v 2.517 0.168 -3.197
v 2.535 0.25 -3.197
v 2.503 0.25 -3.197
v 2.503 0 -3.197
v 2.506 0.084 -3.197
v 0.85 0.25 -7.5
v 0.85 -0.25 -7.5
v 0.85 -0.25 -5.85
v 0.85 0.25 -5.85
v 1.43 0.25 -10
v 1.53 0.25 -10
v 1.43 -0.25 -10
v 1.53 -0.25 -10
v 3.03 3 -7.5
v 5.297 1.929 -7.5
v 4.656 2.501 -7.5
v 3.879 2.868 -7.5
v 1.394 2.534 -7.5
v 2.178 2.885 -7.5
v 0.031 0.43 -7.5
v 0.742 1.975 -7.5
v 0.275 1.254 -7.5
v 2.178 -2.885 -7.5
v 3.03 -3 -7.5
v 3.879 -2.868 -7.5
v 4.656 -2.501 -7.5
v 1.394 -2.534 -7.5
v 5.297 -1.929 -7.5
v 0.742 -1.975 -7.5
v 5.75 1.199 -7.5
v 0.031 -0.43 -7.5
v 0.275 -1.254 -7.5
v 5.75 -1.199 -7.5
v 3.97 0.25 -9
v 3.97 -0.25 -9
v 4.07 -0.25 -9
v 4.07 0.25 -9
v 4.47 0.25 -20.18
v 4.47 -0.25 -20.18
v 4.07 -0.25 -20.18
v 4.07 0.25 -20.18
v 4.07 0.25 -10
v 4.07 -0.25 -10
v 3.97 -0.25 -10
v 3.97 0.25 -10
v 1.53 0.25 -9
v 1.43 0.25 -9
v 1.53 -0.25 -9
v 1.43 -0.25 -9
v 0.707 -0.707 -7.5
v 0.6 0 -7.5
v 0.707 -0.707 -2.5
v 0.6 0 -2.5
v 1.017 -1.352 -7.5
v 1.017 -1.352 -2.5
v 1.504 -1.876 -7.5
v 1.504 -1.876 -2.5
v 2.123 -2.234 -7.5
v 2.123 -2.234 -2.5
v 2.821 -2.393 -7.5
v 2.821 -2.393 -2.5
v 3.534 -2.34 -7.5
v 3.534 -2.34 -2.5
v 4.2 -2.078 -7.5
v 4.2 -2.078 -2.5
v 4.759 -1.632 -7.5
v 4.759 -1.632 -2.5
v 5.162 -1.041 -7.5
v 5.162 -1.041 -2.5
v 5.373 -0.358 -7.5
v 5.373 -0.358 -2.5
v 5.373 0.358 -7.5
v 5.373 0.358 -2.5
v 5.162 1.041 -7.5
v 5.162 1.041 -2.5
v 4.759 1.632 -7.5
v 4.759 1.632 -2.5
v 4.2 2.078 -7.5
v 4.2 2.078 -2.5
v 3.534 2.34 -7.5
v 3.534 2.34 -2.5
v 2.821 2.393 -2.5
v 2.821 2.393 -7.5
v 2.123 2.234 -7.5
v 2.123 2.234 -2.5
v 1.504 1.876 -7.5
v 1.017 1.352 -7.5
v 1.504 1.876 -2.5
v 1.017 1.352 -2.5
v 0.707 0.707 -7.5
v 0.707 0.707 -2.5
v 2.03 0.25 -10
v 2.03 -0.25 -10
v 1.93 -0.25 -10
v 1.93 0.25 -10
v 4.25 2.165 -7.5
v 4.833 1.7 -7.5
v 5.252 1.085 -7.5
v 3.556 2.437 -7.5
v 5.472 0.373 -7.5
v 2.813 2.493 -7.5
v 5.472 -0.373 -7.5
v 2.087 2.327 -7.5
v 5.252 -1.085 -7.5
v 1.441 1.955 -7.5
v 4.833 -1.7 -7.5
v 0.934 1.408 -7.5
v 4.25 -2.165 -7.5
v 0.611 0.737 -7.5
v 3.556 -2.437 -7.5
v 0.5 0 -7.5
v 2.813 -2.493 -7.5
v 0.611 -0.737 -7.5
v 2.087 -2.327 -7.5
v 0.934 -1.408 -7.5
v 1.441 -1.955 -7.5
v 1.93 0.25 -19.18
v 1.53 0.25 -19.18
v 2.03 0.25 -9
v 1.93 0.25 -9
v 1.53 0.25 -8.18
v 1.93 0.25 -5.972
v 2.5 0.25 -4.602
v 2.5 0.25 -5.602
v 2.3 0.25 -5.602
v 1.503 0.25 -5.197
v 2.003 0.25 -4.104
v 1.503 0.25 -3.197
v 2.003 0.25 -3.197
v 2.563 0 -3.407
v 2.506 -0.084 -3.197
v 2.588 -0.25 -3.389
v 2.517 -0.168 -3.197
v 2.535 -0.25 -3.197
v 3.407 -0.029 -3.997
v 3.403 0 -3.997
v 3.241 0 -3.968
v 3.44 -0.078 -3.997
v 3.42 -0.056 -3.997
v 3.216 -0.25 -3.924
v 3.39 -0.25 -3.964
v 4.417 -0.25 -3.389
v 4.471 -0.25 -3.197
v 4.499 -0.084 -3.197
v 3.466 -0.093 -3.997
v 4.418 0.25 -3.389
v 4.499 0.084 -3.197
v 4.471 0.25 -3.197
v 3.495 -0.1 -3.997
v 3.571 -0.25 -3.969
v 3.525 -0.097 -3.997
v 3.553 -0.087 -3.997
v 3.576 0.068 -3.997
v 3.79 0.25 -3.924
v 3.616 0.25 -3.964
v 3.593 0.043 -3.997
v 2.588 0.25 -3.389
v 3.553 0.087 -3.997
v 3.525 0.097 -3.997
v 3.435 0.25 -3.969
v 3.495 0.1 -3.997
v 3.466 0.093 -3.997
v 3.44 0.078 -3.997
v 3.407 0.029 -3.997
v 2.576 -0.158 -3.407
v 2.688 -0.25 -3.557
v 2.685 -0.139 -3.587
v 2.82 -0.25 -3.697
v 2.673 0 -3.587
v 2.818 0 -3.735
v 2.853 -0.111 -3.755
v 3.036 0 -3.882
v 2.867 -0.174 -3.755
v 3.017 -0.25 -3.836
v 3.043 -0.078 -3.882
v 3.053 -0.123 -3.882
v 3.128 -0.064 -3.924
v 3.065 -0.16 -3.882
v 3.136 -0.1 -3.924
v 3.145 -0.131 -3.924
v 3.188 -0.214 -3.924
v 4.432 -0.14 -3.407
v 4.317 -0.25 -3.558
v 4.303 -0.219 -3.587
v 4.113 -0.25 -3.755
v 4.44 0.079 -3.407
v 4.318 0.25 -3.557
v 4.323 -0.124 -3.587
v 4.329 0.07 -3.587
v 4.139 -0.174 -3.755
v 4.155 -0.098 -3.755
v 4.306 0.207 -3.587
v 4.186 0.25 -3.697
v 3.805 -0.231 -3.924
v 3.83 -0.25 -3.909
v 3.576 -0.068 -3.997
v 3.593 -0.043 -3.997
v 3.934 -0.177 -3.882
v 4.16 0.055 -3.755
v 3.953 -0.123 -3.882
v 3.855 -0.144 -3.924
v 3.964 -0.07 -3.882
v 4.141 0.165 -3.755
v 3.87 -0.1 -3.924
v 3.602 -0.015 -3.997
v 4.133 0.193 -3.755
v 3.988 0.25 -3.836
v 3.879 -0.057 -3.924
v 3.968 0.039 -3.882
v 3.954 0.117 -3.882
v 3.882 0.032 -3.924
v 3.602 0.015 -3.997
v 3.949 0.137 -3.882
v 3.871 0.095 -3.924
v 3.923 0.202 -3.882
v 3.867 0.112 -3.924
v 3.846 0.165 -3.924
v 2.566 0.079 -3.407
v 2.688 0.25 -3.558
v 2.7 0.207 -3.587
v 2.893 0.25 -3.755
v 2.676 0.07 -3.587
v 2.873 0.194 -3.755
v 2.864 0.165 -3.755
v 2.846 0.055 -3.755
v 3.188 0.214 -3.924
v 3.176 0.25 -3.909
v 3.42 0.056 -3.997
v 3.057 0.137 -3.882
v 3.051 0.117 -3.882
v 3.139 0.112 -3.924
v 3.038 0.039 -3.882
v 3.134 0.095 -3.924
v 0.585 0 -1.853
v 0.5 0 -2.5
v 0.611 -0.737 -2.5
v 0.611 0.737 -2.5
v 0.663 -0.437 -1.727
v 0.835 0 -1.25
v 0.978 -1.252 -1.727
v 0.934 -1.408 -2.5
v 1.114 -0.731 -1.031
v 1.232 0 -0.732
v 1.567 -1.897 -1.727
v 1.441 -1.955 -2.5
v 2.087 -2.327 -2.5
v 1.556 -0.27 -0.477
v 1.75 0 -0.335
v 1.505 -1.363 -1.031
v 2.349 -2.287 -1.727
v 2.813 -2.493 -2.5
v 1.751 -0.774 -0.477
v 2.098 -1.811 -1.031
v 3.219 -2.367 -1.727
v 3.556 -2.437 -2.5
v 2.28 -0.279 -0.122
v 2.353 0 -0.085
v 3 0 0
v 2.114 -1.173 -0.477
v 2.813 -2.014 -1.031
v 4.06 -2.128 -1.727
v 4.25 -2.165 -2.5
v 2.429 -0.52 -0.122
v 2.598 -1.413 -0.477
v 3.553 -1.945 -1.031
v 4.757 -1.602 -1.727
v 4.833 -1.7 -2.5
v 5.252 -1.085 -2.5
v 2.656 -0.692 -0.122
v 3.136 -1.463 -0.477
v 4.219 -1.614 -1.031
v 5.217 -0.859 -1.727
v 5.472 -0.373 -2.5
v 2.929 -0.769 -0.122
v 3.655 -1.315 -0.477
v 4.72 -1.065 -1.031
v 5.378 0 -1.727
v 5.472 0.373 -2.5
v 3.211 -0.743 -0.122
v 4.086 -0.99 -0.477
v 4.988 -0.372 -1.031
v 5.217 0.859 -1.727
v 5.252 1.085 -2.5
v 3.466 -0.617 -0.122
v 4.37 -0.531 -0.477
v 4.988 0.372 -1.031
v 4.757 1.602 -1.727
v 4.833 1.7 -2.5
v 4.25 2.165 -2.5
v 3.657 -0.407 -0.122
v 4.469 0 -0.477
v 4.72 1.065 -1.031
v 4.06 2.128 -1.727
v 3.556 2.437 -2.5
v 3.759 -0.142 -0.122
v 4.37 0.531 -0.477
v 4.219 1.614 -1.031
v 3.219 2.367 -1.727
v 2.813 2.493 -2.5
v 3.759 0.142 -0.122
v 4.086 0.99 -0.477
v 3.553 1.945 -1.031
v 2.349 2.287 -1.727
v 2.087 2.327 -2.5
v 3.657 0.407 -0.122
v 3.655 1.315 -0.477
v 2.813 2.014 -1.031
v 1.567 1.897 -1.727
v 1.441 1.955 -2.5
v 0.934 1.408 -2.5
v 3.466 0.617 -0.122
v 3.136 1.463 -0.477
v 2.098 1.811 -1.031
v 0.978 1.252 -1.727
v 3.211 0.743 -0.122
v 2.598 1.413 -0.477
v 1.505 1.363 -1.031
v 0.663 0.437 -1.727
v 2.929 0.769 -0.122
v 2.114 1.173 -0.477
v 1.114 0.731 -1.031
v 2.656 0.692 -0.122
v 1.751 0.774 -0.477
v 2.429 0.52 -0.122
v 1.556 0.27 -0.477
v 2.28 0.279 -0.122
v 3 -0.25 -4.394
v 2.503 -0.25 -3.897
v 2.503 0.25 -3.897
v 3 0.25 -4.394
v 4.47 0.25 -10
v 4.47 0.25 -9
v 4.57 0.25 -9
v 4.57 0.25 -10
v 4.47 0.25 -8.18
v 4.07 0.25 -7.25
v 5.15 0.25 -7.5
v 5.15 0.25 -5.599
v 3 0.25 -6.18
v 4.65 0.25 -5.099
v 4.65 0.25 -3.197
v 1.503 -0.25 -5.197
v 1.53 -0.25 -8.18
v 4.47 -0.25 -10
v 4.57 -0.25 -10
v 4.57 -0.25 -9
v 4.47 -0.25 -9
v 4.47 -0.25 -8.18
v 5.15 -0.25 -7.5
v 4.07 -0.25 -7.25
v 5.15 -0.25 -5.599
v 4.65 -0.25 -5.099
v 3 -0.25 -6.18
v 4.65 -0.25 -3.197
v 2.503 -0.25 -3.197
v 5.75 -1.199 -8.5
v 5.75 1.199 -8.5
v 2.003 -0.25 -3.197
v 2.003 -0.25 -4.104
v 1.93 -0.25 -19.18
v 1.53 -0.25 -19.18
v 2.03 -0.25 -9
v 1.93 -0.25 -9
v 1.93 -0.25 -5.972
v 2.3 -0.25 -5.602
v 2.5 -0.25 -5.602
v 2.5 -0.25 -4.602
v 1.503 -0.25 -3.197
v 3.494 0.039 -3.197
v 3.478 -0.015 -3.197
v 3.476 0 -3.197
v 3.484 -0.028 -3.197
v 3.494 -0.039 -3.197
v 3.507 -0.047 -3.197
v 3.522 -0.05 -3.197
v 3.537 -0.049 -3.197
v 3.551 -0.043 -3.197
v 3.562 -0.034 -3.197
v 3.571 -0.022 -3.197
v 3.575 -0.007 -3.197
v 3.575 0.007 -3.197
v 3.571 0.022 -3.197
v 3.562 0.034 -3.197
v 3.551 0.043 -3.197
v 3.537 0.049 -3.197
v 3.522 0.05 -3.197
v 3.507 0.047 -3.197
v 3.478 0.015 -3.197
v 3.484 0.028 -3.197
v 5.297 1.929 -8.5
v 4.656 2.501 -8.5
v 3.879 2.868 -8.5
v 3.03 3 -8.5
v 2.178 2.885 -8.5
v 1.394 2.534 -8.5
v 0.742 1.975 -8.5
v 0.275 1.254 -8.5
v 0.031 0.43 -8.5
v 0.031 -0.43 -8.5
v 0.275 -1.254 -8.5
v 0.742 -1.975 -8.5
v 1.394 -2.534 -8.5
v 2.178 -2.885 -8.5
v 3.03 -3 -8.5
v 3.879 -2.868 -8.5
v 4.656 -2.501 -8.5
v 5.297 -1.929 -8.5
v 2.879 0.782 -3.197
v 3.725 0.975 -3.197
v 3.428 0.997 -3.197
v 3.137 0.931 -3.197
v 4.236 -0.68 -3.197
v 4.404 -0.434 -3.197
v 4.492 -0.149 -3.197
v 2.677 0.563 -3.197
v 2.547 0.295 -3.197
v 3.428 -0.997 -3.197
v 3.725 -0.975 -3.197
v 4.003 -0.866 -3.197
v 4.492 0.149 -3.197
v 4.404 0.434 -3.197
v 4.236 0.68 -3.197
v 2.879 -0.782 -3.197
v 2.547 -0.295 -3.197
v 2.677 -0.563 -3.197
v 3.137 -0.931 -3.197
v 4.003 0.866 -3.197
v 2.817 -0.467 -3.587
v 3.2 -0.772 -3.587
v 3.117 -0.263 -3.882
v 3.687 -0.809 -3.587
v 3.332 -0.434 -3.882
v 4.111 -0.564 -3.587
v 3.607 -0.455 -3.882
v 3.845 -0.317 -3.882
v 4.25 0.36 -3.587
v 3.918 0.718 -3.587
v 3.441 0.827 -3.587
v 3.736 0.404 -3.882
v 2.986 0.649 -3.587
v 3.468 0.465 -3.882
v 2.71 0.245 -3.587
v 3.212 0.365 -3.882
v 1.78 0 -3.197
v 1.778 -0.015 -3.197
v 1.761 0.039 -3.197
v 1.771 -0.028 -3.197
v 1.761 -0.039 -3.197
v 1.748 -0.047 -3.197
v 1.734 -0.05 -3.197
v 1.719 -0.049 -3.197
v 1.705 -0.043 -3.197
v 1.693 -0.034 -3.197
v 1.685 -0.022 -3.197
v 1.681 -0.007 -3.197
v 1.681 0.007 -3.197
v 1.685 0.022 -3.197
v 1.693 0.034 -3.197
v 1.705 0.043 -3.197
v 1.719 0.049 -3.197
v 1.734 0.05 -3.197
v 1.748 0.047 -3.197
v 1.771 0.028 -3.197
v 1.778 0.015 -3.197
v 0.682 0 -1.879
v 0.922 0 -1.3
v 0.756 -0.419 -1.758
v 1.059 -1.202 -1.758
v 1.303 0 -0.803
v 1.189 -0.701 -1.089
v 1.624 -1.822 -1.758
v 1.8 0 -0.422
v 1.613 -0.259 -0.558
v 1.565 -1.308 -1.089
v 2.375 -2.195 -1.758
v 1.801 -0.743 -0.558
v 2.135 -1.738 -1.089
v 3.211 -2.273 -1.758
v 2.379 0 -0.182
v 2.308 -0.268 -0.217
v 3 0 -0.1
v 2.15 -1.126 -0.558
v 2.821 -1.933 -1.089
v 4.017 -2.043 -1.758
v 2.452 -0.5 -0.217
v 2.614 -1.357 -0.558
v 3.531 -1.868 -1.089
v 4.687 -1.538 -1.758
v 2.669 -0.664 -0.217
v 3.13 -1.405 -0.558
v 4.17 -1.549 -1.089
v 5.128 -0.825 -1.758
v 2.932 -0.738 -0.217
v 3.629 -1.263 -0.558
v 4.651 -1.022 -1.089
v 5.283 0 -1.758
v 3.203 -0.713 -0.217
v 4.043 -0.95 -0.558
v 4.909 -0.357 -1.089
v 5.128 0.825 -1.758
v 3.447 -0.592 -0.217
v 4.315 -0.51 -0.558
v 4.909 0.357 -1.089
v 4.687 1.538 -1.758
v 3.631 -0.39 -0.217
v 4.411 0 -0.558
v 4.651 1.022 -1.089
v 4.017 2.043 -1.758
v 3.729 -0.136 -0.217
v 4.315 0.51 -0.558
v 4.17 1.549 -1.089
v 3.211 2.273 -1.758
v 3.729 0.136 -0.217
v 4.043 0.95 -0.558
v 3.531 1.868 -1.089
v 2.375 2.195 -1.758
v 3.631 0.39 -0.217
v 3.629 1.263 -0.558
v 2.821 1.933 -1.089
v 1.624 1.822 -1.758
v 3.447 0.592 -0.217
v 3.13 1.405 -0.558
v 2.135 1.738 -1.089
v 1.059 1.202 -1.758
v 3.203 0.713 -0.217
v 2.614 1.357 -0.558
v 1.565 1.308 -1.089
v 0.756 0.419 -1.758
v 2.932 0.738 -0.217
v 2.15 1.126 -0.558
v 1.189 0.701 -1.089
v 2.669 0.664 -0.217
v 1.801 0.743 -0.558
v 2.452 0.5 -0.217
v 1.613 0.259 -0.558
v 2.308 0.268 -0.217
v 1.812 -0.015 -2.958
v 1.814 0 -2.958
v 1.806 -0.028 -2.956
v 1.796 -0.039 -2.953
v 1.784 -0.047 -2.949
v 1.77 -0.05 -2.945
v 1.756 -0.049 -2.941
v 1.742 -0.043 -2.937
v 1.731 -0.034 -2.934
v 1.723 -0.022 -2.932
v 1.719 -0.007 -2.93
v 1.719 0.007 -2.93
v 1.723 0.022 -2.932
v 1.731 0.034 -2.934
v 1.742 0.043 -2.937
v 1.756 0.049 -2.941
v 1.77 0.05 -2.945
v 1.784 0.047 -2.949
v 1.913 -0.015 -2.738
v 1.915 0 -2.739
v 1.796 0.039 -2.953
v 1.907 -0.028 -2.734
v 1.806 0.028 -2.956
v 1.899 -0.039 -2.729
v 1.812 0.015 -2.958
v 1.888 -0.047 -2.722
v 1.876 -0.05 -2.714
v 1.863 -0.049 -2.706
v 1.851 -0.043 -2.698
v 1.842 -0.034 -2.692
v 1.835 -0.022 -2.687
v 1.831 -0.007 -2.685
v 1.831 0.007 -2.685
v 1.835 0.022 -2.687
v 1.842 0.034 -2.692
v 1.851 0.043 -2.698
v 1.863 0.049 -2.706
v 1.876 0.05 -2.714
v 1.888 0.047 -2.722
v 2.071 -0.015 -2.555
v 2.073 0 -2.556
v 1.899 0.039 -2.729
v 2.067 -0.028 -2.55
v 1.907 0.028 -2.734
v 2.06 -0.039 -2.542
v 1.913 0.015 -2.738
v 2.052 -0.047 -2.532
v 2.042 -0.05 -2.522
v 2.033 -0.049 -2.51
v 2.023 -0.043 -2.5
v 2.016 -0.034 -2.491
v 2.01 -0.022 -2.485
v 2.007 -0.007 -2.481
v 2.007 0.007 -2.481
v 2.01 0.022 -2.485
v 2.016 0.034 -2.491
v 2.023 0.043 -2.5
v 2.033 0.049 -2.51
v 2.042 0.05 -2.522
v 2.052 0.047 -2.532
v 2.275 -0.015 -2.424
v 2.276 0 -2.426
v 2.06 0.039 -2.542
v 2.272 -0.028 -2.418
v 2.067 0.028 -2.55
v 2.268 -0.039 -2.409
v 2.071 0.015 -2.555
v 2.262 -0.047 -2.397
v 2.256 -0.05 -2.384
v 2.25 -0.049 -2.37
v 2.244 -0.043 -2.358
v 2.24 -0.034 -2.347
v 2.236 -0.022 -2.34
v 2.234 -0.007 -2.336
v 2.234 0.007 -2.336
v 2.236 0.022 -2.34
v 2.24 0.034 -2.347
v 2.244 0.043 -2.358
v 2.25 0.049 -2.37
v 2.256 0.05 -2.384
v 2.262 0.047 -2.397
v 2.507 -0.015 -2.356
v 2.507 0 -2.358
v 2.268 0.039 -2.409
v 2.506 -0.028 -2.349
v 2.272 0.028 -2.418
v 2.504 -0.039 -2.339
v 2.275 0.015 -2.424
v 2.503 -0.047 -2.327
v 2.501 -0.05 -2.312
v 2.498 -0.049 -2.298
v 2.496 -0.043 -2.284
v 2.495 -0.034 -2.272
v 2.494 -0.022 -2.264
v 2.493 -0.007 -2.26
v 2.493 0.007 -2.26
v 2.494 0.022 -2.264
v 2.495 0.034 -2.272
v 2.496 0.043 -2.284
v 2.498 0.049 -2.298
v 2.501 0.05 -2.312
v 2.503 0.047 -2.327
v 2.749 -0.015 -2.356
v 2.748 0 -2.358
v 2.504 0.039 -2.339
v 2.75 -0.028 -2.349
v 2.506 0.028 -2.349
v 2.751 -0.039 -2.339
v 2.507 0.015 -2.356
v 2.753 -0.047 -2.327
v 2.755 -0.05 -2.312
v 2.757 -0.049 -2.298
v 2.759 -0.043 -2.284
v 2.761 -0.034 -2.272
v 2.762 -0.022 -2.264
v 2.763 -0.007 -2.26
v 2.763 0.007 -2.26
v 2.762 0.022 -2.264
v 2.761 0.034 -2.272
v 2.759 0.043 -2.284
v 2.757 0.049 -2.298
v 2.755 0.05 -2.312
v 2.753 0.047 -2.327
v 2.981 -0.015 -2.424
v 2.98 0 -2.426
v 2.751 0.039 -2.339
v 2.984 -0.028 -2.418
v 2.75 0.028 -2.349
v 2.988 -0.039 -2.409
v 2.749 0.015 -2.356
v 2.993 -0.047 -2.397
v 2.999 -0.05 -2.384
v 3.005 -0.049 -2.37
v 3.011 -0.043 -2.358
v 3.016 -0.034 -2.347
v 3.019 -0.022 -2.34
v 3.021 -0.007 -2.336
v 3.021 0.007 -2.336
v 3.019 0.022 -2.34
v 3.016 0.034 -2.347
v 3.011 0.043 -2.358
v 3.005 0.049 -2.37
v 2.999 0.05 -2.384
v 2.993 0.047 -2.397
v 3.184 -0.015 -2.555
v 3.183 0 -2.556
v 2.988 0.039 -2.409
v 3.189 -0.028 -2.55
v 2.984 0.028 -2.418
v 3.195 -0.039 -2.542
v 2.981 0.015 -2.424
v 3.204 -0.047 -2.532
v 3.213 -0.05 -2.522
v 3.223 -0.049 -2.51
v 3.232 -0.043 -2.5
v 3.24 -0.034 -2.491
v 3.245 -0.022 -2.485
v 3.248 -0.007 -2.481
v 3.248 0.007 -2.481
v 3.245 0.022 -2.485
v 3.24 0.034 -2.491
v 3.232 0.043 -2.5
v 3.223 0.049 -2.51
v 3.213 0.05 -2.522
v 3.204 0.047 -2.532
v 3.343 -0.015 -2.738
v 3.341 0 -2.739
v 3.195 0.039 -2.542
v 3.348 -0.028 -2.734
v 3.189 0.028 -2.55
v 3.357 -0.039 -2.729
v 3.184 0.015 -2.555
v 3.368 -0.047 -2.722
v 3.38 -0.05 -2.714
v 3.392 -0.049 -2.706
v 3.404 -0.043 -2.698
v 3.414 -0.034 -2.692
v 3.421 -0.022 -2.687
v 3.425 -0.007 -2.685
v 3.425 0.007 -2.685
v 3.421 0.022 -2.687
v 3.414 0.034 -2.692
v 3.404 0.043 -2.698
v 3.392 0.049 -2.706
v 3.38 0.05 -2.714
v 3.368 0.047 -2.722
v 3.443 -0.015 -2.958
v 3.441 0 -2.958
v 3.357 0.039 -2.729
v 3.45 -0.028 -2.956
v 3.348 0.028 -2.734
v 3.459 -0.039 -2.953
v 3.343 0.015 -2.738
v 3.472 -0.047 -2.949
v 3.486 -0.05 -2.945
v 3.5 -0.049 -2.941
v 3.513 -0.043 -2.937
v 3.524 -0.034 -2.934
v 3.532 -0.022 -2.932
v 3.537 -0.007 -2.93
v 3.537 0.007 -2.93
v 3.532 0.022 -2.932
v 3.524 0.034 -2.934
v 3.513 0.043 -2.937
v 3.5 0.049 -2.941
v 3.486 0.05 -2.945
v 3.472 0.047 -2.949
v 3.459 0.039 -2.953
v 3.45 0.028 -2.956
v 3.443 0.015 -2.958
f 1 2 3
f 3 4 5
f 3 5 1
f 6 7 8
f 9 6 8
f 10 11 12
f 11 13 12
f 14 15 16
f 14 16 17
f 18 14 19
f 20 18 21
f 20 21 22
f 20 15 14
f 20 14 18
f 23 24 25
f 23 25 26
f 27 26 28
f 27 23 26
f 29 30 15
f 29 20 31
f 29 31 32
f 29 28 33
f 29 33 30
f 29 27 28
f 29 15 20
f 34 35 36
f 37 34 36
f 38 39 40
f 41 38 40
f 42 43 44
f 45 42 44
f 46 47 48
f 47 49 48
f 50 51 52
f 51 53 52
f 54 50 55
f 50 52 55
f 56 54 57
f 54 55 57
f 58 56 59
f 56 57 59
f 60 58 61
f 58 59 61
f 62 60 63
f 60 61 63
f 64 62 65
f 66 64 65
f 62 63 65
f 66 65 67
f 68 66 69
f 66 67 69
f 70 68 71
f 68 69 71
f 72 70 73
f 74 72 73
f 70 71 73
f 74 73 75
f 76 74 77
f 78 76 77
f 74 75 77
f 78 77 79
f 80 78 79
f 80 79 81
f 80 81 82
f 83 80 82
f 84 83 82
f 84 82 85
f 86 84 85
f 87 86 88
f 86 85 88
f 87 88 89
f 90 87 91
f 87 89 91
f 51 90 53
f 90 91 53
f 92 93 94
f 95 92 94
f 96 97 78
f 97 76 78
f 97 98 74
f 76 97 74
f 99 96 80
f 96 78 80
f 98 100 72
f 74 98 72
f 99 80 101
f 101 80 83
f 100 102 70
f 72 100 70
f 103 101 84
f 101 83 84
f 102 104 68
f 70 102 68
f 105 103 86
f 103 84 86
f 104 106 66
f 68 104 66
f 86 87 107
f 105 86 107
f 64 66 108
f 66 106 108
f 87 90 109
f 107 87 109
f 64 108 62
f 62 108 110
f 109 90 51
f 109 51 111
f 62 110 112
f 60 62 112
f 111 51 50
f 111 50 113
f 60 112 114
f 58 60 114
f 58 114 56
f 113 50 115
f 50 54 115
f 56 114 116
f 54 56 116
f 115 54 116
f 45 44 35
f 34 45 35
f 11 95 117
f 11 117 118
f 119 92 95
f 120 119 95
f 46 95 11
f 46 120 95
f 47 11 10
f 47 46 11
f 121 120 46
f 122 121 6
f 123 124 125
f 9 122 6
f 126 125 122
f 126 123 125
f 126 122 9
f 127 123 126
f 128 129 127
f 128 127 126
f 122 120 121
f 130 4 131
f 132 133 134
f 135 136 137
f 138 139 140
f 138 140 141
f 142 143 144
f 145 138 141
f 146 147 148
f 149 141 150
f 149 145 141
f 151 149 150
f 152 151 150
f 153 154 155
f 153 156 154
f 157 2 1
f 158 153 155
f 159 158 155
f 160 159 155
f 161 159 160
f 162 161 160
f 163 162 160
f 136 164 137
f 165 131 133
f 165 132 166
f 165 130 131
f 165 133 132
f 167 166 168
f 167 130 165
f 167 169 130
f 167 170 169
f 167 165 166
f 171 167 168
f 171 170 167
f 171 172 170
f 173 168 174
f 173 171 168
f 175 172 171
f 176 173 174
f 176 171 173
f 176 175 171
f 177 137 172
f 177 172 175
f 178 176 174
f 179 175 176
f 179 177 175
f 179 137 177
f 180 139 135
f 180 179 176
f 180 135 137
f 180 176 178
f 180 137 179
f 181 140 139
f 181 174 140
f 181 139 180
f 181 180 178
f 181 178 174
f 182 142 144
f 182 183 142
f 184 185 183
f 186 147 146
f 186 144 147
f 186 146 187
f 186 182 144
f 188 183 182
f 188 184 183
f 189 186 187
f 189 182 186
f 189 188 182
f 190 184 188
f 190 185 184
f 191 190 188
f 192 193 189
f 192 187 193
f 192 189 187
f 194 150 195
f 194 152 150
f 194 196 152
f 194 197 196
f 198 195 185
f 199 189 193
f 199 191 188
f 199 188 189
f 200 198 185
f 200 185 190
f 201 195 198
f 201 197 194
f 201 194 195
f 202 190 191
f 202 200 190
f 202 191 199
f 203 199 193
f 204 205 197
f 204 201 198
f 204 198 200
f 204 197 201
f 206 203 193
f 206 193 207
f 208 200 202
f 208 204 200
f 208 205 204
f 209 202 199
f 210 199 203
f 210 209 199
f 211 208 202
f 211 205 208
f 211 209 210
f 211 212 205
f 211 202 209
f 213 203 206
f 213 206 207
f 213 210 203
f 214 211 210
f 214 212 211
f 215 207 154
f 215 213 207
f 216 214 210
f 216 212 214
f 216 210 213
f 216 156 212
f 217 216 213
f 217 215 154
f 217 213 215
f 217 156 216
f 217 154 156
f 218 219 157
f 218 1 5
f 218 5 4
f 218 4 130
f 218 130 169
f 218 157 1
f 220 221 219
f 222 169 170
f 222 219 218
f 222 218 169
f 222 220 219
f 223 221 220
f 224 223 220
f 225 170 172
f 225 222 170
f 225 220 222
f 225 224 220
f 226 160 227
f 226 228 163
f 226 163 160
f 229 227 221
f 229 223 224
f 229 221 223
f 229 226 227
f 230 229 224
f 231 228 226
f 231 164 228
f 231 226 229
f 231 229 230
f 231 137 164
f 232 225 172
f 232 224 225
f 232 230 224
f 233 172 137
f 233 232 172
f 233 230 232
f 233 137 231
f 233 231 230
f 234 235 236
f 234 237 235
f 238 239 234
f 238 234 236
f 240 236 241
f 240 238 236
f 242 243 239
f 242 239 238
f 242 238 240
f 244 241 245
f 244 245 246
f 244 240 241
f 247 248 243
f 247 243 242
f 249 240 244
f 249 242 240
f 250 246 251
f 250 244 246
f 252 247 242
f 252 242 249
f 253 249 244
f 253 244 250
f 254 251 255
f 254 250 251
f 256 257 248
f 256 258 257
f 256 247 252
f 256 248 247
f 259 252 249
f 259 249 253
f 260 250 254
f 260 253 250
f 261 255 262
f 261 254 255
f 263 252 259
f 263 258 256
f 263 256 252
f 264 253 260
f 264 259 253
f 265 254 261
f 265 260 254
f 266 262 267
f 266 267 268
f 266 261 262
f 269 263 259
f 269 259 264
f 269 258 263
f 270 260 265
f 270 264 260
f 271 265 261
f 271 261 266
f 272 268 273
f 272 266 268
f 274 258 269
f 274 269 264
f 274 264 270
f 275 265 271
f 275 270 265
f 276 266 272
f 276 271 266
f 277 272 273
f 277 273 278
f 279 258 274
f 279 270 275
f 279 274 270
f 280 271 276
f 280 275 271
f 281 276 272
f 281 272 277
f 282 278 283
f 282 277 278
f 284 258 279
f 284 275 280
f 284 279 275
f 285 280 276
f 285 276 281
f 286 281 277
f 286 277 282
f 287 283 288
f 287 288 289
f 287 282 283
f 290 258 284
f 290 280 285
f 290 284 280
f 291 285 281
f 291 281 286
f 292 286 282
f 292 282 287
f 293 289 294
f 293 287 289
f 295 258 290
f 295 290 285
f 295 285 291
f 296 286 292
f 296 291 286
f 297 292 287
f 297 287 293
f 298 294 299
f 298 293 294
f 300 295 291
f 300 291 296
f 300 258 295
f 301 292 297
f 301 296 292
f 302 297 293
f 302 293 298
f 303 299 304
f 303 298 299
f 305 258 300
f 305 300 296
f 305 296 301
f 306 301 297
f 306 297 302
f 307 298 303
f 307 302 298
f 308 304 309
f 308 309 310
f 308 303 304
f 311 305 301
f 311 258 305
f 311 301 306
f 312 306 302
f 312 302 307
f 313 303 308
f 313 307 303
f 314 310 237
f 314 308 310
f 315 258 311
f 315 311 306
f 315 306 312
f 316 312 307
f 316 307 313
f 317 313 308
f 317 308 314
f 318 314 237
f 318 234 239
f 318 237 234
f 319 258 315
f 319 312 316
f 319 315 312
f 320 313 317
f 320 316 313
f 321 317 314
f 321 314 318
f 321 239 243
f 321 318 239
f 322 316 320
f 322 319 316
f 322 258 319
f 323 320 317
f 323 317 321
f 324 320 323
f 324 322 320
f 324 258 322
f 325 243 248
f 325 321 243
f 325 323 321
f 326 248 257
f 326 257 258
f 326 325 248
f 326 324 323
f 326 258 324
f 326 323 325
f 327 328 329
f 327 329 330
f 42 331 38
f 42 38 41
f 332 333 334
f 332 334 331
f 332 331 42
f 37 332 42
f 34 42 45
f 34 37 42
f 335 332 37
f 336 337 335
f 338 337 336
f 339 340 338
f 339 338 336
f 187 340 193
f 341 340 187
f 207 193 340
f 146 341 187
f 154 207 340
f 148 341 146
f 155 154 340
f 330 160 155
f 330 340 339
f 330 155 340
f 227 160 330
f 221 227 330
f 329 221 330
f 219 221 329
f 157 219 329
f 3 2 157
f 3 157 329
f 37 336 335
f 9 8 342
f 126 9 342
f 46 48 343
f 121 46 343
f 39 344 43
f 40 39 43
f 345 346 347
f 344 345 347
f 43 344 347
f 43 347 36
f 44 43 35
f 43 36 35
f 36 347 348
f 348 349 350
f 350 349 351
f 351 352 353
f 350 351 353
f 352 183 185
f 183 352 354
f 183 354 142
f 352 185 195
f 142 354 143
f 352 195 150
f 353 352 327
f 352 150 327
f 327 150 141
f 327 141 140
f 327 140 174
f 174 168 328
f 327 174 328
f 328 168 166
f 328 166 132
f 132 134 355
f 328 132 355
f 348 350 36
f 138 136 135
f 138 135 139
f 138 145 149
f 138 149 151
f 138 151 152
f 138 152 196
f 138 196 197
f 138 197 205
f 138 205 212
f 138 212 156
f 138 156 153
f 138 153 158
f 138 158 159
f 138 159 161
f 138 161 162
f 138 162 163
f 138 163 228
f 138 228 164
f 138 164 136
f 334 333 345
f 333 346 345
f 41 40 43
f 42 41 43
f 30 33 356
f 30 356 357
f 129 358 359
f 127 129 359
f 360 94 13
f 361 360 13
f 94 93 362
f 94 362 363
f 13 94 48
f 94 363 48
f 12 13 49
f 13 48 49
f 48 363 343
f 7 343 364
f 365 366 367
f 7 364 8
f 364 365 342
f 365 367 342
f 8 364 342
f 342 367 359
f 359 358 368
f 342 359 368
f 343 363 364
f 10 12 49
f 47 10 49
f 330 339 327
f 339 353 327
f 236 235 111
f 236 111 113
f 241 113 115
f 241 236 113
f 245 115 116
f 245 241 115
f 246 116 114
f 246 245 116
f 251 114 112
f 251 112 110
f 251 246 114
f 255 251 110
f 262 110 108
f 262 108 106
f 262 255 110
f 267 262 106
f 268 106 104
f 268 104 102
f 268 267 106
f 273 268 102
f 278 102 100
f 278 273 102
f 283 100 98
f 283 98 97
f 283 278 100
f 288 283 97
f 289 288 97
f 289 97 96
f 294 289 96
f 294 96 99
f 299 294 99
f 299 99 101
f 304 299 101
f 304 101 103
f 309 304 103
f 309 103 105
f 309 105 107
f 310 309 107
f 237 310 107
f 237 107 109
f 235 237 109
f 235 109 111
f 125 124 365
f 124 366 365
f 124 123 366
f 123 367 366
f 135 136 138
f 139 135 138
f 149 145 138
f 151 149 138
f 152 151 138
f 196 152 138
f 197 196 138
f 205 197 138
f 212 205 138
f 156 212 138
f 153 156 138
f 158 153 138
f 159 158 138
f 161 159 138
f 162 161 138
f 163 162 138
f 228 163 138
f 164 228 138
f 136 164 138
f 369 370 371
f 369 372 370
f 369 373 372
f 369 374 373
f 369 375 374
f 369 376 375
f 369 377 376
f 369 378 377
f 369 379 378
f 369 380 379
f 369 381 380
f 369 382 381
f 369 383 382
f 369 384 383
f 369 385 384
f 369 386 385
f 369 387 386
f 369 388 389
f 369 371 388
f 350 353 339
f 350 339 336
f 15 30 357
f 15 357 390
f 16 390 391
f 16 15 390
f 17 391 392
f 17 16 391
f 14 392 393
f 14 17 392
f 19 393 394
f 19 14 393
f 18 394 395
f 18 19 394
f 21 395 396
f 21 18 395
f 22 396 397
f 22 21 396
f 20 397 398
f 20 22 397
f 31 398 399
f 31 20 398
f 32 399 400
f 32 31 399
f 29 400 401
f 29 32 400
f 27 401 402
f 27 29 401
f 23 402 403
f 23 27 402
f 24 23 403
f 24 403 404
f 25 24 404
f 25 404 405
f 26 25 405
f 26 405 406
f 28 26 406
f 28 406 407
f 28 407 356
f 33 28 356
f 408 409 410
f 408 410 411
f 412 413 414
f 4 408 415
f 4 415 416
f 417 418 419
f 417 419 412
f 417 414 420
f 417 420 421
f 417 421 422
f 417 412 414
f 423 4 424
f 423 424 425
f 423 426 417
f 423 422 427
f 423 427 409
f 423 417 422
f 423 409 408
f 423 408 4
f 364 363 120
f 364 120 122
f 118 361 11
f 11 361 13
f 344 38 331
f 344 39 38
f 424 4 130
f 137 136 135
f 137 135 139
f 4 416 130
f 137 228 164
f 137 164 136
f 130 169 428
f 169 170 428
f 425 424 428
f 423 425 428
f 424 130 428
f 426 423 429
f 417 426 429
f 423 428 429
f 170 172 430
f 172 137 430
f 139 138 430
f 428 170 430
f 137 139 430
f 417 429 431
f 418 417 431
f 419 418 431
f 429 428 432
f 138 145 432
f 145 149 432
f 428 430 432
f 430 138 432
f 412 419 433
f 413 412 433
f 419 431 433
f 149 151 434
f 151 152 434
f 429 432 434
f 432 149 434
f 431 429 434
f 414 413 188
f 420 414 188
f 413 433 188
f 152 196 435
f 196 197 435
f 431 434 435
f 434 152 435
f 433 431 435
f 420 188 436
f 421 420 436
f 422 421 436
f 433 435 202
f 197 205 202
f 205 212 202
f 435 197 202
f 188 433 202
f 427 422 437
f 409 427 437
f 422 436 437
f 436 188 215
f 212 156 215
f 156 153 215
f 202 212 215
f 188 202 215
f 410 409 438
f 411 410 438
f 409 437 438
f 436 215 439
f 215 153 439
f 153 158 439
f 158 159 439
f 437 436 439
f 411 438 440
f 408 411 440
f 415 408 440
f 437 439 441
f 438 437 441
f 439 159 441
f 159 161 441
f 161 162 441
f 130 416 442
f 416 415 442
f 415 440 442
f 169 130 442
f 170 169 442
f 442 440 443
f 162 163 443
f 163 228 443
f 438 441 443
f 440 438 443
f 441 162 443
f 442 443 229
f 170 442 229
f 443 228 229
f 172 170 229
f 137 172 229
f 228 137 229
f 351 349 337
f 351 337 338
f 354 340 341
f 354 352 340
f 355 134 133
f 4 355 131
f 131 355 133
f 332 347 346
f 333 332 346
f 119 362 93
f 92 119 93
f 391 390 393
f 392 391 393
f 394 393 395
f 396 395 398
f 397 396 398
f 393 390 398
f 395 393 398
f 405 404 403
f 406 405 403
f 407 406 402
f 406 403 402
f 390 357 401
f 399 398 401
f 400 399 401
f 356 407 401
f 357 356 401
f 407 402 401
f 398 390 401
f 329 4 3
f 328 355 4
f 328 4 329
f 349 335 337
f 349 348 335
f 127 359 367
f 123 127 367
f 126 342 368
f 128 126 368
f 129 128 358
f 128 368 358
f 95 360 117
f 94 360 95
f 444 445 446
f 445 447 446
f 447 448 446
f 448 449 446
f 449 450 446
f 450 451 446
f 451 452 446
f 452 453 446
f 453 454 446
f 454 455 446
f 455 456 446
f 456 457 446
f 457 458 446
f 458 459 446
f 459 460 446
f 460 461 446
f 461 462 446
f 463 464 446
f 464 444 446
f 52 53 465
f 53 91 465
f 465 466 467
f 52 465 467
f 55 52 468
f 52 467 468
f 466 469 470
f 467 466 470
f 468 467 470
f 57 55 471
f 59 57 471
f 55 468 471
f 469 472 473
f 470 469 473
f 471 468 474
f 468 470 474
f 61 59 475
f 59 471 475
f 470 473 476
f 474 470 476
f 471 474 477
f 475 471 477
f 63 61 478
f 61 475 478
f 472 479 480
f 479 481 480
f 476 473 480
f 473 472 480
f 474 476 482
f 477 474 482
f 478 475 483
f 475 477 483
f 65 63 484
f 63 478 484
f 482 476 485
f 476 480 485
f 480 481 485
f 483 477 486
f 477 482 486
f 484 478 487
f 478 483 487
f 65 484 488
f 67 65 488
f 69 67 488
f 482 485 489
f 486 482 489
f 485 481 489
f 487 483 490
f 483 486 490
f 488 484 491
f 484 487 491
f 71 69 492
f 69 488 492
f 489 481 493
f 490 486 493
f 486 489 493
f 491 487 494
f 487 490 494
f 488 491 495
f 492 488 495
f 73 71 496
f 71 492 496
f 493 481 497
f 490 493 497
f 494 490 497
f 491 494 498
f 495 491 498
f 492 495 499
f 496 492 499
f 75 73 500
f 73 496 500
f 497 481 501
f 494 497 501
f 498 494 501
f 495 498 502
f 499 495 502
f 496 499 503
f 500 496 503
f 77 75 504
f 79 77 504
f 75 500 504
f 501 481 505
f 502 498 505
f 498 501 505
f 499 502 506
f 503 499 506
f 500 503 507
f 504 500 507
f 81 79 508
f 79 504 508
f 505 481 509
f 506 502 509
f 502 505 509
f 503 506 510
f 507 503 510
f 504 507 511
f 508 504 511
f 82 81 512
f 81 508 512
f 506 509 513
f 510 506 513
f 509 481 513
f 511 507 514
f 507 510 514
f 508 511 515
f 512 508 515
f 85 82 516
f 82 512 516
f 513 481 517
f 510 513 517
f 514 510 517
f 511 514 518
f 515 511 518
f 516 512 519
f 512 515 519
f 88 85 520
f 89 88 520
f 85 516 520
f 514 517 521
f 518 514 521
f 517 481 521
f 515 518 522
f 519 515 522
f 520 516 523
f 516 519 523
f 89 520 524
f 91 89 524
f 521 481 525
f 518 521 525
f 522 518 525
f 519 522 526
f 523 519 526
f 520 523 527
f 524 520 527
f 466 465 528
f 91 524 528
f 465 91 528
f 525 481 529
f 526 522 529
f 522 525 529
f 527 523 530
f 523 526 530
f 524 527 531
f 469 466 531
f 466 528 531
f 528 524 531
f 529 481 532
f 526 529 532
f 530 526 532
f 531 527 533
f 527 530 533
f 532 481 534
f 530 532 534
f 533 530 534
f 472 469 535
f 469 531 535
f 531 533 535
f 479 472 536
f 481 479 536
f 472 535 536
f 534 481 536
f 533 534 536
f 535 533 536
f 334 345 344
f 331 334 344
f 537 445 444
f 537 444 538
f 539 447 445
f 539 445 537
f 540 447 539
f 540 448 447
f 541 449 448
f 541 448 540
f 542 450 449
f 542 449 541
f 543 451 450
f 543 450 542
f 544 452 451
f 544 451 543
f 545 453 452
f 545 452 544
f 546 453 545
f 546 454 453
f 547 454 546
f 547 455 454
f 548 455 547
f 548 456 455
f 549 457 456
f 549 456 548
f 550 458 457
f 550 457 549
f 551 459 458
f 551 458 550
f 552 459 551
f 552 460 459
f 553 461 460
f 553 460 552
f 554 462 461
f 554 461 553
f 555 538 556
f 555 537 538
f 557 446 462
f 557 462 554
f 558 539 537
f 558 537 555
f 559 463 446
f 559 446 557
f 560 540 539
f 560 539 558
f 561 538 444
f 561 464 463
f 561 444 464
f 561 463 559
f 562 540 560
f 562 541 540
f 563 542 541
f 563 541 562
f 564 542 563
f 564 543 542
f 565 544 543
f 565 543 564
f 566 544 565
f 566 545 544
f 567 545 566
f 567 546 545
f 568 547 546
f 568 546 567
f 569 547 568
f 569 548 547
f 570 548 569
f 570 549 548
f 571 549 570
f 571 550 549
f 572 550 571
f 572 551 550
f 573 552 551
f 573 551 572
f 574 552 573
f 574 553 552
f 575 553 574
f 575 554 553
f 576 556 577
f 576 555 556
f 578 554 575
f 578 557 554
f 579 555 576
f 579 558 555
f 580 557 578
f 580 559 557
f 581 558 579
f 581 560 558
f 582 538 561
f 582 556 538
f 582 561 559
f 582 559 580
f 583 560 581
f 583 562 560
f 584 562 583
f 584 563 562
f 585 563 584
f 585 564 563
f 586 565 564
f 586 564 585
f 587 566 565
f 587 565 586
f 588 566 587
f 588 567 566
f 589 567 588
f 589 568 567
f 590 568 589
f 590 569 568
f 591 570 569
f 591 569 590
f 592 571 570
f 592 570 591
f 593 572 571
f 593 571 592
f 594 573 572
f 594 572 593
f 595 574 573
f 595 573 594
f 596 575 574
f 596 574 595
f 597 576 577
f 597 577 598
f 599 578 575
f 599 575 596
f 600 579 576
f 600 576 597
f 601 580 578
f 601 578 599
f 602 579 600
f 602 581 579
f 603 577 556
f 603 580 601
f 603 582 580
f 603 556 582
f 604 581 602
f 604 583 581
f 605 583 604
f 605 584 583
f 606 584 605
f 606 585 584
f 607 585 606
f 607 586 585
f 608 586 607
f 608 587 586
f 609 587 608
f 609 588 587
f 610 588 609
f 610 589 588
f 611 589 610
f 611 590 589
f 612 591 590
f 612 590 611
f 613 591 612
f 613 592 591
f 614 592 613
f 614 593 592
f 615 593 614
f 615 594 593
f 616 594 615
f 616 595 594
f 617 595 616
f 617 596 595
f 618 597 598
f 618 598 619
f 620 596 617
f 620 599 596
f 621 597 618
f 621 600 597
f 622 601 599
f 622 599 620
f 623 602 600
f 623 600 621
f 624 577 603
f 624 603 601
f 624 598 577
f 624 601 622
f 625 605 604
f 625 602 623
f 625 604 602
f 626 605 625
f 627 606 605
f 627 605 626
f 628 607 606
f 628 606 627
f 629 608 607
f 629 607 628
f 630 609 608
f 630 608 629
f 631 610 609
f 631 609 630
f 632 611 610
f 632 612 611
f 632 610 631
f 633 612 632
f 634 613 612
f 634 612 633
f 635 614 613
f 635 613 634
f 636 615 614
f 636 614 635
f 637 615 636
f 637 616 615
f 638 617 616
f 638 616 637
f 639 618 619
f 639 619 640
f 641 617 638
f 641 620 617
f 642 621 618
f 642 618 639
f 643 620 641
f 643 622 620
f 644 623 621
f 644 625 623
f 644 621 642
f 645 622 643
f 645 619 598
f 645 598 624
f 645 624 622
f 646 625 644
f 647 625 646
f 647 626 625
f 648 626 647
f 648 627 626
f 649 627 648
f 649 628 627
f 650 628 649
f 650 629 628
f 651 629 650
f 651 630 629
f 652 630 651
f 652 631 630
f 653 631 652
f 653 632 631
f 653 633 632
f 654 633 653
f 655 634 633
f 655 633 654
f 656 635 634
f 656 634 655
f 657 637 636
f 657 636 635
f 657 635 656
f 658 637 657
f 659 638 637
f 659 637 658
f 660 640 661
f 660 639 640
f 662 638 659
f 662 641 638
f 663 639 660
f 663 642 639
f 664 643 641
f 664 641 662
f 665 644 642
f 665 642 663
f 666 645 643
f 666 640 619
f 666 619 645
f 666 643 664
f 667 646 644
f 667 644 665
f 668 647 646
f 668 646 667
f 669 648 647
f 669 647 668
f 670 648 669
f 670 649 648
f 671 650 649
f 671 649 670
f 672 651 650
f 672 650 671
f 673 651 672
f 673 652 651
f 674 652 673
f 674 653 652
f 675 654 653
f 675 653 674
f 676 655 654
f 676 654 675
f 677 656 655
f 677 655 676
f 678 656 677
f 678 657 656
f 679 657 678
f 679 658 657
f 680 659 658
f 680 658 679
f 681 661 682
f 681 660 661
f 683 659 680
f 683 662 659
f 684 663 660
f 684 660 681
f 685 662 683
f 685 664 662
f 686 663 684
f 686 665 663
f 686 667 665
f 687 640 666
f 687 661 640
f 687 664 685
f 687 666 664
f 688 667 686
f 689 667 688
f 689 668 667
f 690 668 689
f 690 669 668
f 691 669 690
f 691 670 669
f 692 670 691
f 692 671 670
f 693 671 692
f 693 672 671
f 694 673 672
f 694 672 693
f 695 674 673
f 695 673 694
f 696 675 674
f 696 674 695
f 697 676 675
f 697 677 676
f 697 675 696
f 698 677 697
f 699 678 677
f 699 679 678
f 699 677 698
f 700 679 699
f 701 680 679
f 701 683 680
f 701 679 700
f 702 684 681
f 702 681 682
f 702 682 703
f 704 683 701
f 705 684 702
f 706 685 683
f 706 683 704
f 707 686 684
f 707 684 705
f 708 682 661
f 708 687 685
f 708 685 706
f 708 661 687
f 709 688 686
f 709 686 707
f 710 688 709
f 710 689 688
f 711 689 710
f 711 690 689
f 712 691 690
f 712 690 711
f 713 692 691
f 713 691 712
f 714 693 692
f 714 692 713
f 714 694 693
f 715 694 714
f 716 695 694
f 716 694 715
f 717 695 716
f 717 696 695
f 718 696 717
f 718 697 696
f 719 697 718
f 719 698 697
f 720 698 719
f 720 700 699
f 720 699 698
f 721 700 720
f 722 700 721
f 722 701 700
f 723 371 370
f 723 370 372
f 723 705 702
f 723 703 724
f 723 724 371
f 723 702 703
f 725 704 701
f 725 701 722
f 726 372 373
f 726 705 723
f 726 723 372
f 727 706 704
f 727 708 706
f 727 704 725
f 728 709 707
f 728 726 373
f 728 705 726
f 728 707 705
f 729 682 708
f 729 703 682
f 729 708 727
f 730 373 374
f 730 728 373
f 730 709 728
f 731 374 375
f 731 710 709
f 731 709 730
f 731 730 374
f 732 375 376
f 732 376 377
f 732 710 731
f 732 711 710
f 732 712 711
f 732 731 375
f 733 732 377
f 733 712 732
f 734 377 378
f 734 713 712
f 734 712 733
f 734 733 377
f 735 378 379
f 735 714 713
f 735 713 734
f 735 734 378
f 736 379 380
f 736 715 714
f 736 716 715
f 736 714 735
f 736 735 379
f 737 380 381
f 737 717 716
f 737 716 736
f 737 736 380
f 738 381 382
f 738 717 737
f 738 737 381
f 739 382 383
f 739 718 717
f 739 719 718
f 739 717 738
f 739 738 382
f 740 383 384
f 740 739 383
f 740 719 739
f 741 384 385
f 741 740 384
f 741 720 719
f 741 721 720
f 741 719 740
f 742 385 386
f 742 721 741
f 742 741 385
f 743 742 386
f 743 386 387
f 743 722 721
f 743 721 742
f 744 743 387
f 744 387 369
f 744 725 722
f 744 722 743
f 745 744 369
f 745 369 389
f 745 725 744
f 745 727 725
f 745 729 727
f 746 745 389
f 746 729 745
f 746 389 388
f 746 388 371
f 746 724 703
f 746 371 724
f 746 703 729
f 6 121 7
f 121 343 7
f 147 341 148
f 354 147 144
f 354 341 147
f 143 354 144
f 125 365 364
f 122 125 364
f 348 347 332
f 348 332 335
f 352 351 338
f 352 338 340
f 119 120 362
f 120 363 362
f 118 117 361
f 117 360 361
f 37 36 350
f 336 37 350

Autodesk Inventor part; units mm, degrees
ref_plane "YZ Plane" through (0, 0, 0) normal (1, 0, 0) x (0, 1, 0)
ref_plane "XZ Plane" through (0, 0, 0) normal (0, 1, 0) x (-1, 0, 0)
ref_plane "XY Plane" through (0, 0, 0) normal (0, 0, 1) x (1, 0, 0)
sketch "Sketch1" plane through (0, 0, 0) normal (0, 1, 0) x (-1, 0, 0)
  line L0 (-1.93, -19.18) -> (-1.53, -19.18)
  line L1 (-4.47, -20.18) -> (-4.07, -20.18)
  line L2 (-0.5, -2.5) -> (-5.5, -2.5) construction
  line L3 (-5.5, -2.5) -> (-5.5, -7.5)
  line L4 (-5.5, -7.5) -> (-0.5, -7.5)
  line L5 (-0.5, -7.5) -> (-0.5, -2.5)
  line L6 (0, -7.5) -> (-6, -7.5)
  line L7 (-6, -7.5) -> (-6, -8.5)
  line L8 (-6, -8.5) -> (0, -8.5)
  line L9 (0, -8.5) -> (0, -7.5)
  arc A0 (-0.5, -2.5) -> (-5.5, -2.5) centre (-3, -2.5) ccw
  line L10 (0, -24.216) -> (0, 4.0361) projected
  line L11 (17.1925, 0) -> (-9.8654, 0) projected
  line L12 (-3, -8.5) -> (-3, -19.8408) construction
  line L13 (-1.53, -19.18) -> (-1.53, -10)
  line L14 (-1.93, -19.18) -> (-1.93, -10)
  line L15 (-4.07, -20.18) -> (-4.07, -10)
  line L16 (-4.47, -20.18) -> (-4.47, -10)
  line L17 (-3, -8.5) -> (-3, 0)
  line L18 (-6, -19.8408) -> (0, -19.8408) construction
  line L19 (-1.43, -9) -> (-1.53, -9)
  line L20 (-2.03, -9) -> (-2.03, -10)
  line L21 (-2.03, -10) -> (-1.93, -10)
  line L22 (-1.43, -10) -> (-1.43, -9)
  line L23 (-3.97, -9) -> (-4.07, -9)
  line L24 (-4.57, -9) -> (-4.57, -10)
  line L25 (-4.57, -10) -> (-4.47, -10)
  line L26 (-3.97, -10) -> (-3.97, -9)
  line L27 (-1.93, -9) -> (-2.03, -9)
  line L28 (-4.07, -9) -> (-4.07, -7.25)
  line L29 (-4.47, -9) -> (-4.57, -9)
  line L30 (-4.07, -10) -> (-3.97, -10)
  line L31 (-1.53, -10) -> (-1.43, -10)
  line L32 (-4.47, -9) -> (-4.47, -8.18)
  line L33 (-1.93, -9) -> (-1.93, -5.9716)
  line L34 (-1.53, -9) -> (-1.53, -8.18)
  line L35 (-4.47, -8.18) -> (-5.15, -7.5)
  line L36 (-1.53, -8.18) -> (-0.85, -7.5)
  line L37 (-0.85, -7.5) -> (-0.85, -5.85)
  line L38 (-5.15, -7.5) -> (-5.15, -5.5986)
  line L39 (-5.15, -5.5986) -> (-4.65, -5.0986)
  line L40 (-4.65, -5.0986) -> (-4.65, -3.1972)
  line L41 (-4.65, -3.1972) -> (-2.5028, -3.1972)
  line L42 (-0.85, -5.85) -> (-1.5028, -5.1972)
  line L43 (-1.5028, -5.1972) -> (-1.5028, -3.1972)
  line L44 (-1.5028, -3.1972) -> (-2.0028, -3.1972)
  line L45 (-2.0028, -3.1972) -> (-2.0028, -4.1043)
  line L46 (-2.0028, -4.1043) -> (-2.5, -4.6016)
  line L47 (-2.5, -4.6016) -> (-2.5, -5.6016)
  line L48 (-2.5, -5.6016) -> (-2.3, -5.6016)
  line L49 (-2.3, -5.6016) -> (-1.93, -5.9716)
  line L50 (8.8309, -12.5892) -> (8.8309, -17.0713)
  line L51 (8.7309, -12.5892) -> (8.8309, -12.5892)
  line L52 (8.8309, -17.0713) -> (9.3309, -17.0713)
  line L53 (9.3309, -17.0713) -> (9.3309, -12.5892)
  line L54 (11.3309, -18.2444) -> (11.8309, -18.2444)
  line L55 (11.3309, -12.5815) -> (11.3309, -18.2444)
  line L56 (11.8309, -18.2444) -> (11.8309, -12.5815)
  line L57 (8.2266, -6.0537) -> (8.2266, -7.4999)
  line L58 (8.5861, -5.6941) -> (8.2266, -6.0537)
  line L59 (8.5861, -4.3452) -> (8.5861, -5.6941)
  line L60 (8.2266, -7.4999) -> (8.8309, -8.1043)
  line L61 (9.3309, -7.3282) -> (9.7365, -6.9226)
  line L62 (9.7365, -6.9226) -> (10.3309, -6.9226)
  line L63 (10.3309, -6.9226) -> (10.3309, -5.844)
  line L64 (8.5861, -4.3452) -> (11.2106, -4.3452)
  line L65 (10.8309, -6.0512) -> (10.8309, -6.9149)
  line L66 (10.8309, -6.9149) -> (11.1527, -6.9149)
  line L67 (11.2393, -4.3452) -> (11.2106, -4.3452)
  line L68 (11.1527, -6.9149) -> (11.3309, -7.0932)
  line L69 (11.8309, -8.0966) -> (12.4276, -7.4999)
  line L70 (12.4276, -7.4999) -> (12.4276, -5.8553)
  line L71 (9.4309, -11.5892) -> (9.3309, -11.5892)
  line L72 (11.8309, -11.5815) -> (11.8309, -8.0966)
  line L73 (8.8309, -8.1043) -> (8.8309, -11.5892)
  line L74 (11.3309, -7.0932) -> (11.3309, -11.5815)
  line L75 (9.3309, -11.5892) -> (9.3309, -7.3282)
  line L76 (10.3309, -5.844) -> (11.2106, -4.9643)
  line L77 (11.7107, -5.1714) -> (10.8309, -6.0512)
  line L78 (11.2106, -4.3452) -> (11.2393, -4.3452) construction
  line L79 (12.4276, -5.8553) -> (12.2082, -5.6359)
  line L80 (11.2106, -4.2719) -> (11.2106, -4.3452)
  line L81 (11.2106, -4.9643) -> (11.2106, -4.2719)
  line L82 (11.2106, -4.2719) -> (11.2393, -4.3452)
  line L83 (11.7107, -4.3453) -> (11.7107, -5.1714)
  line L84 (10.8445, -3.7709) -> (11.3445, -3.7709) construction
  spline S0 degree 3 poles (11.9954, -4.3997) (11.9862, -4.3486) (11.9578, -4.2521) (11.8889, -4.1254) (11.7974, -4.0171) (11.6749, -3.9177) (11.5186, -3.8358) (11.3301, -3.782) (11.1322, -3.7647) (10.9338, -3.7851) (10.7437, -3.8443) (10.5851, -3.9352) (10.4598, -4.0478) (10.3654, -4.1727) (10.2931, -4.3216) (10.262, -4.4371) (10.2513, -4.4991) knots 0 0 0 0 0.0625 0.125 0.1875 0.25 0.333333 0.416667 0.5 0.583333 0.666667 0.75 0.8125 0.875 0.9375 1 1 1 1
  line L85 (12.2082, -4.3453) -> (11.7107, -4.3453)
  line L86 (12.2082, -5.6359) -> (12.2082, -4.3453)
  line L87 (9.3309, -12.5892) -> (9.4309, -12.5892)
  line L88 (11.2309, -12.5815) -> (11.3309, -12.5815)
  line L89 (11.8309, -12.5815) -> (11.9309, -12.5815)
  line L90 (8.7309, -11.5892) -> (8.7309, -12.5892)
  line L91 (8.8309, -11.5892) -> (8.7309, -11.5892)
  line L92 (9.4309, -12.5892) -> (9.4309, -11.5892)
  line L93 (11.3309, -11.5815) -> (11.2309, -11.5815)
  line L94 (11.2309, -11.5815) -> (11.2309, -12.5815)
  line L95 (11.9309, -12.5815) -> (11.9309, -11.5815)
  line L96 (11.9309, -11.5815) -> (11.8309, -11.5815)
  line L97 (13.3271, -7.4999) -> (7.3271, -7.4999)
  line L98 (7.3271, -7.4999) -> (7.3271, -8.4999)
  line L99 (7.3271, -8.4999) -> (13.3271, -8.4999)
  line L100 (13.3271, -8.4999) -> (13.3271, -7.4999)
  line L101 (12.4276, -7.4999) -> (8.2266, -7.4999)
  line L102 (12.8271, -7.4999) -> (7.8271, -7.4999)
  line L103 (7.8271, -7.4999) -> (7.8271, -2.4999)
  line L104 (7.8271, -2.4999) -> (12.8271, -2.4999) construction
  line L105 (12.8271, -2.4999) -> (12.8271, -7.4999)
  arc A1 (12.8271, -2.4999) -> (7.8271, -2.4999) centre (10.3271, -2.4999) ccw
  line L106 (-2.5028, -3.1972) -> (-2.5028, -3.8972)
  line L107 (-2.5028, -3.8972) -> (-3, -4.3944)
  line L108 (-3, -4.3944) -> (-3, -5.9975)
  line L109 (-3, -6.18) -> (-4.07, -7.25)
  line L110 (-2.5028, -3.1972) -> (-2.0028, -3.1972) construction
  line L111 (-2.5, -5.6016) -> (-3, -5.9975) construction
  point P0 (0, 0)
  point P1 (-3, -7.5)
  point P2 (0, -8)
  point P3 (-1.73, -19.18)
  point P4 (-4.27, -20.18)
  point P5 (-3, -7.5)
  point P6 (0, 0)
  point P7 (7.8271, -7.4999)
  point P8 (10.3271, -7.4999)
  point P9 (-3, -5.196)
  point P10 (-3, -4.3944)
  point P11 (-3, -3.1972)
  dimension "d10" = 5
  dimension "d12" = 6
  dimension "d13" = 5
  dimension "d14" = 6
  dimension "Jarak_Kaki" = 2.54
  dimension "d18" = 1
  dimension "d19" = 0.4
  dimension "d20" = 1.27
  dimension "Panjang_Kaki" = 12
  dimension "d30" = 0.6
  dimension "d31" = 1
  dimension "d32" = 0.5
  dimension "d34" = 135
  dimension "d35" = 0.35
  dimension "d51" = 0.5
  dimension "d76" = 1.65
  dimension "d82" = 2.5
  dimension "d83" = 0.5
  dimension "d84" = 0.5
  dimension "d85" = 1
  dimension "d86" = 0.5
  dimension "d87" = 0.5
  dimension "d89" = 0.7
  dimension "d92" = 0.5
  dimension "d93" = 0.25
  dimension "d95" = 1
  dimension "d104" = 0.2
  dimension "d106" = 2
revolve "Revolution1" add sketch "Sketch1" angle 360 about axis through (3, 0, -8.5) along (0, 0, 1) contours L33 L49 L48 L47 L46 L45 L44 L43 L42 L37 L4 | L4 L17 L107 L106 L41 A0 L5 L37 L42 L43 L44 L45 L46 L47 L48 L49 L33 | L17 L41 L106 L107
shell "Shell1" thickness 0.1 removed faces 1 at (3.6238, -0.5526, -7.5)
revolve "Revolution2" add sketch "Sketch1" angle 360 about axis through (3, 0, -8.5) along (0, 0, 1) separate body contours L33 L4 L36 L34 L8 | L8 L17 L4 L33 | L34 L36 L4 L6 L9 L8
sketch "Sketch2" plane through (3, 0, -7.5) normal (0, 0, 1) x (1, 0, 0)
  line L0 (2.75, 2.5) -> (3.75, 2.5)
  line L1 (3.75, 2.5) -> (3.75, -2.5)
  line L2 (3.75, -2.5) -> (2.75, -2.5)
  line L3 (2.75, -2.5) -> (2.75, 2.5)
  circle A0 centre (0, 0) radius 2.5 projected
  circle A1 centre (0, 0) radius 2.5 projected
  line L4 (-3, -4.2) -> (-3, 4.2) construction
  line L5 (2.5, -1.6681) -> (2.5, 1.3873) construction
  line L6 (-4.368, 0) -> (5.2078, 0) projected
  point P0 (-3, 0)
  point P1 (2.75, 0)
  dimension "d110" = 0.25
  dimension "d111" = 5
  dimension "d112" = 1
extrude "Extrusion1" cut sketch "Sketch2" against normal up to next contours L0 L1 L6 L3 | L6 L1 L2 L3 bodies 2
extrude "Extrusion2" add sketch "Sketch1" along normal mid plane 0.5 separate body contours L14 L21 L20 L27 L33 L8 L34 L19 L22 L31 L13 L0 | L33 L4 L36 L34 L8 | L33 L49 L48 L47 L46 L45 L44 L43 L42 L37 L4 | L28 L23 L26 L30 L15 L1 L16 L25 L24 L29 L32 L8 | L8 L32 L35 L4 L28 | L4 L38 L39 L40 L41 L17 L109 L28 | L17 L41 L106 L107
sketch "Sketch3" plane through (2.4, 0, -4) normal (0, 1, 0) x (1, 0, 0)
  line L0 (0.1028, -0.1028) -> (0.1028, -0.8028) projected
  line L1 (0.1028, -0.8028) -> (0.1694, -0.2824) construction
  line L2 (0.1694, -0.2824) -> (0.7748, -0.0028) construction
  line L3 (0.7748, -0.0028) -> (1.0028, -0.0028) construction
  spline S0 degree 3 poles (0.1028, -0.8028) (0.1694, -0.2824) (0.7748, -0.0028) (1.0028, -0.0028) knots 1 1 1 1 2 2 2 2
  line L4 (0.1028, -0.8028) -> (2.25, -0.8028) projected
  line L5 (1.0028, -0.0028) -> (1.1028, -0.0028)
  line L6 (1.1028, -0.0028) -> (1.1028, -0.8028)
  dimension "d99" = 0.8
  dimension "d100" = 0.9
  dimension "d101" = 0.1
revolve "Revolution3" cut sketch "Sketch3" angle 360 about axis through (3.5028, 0, -3.9972) along (0, 0, 1) bodies 3
revolve "Revolution4" add sketch "Sketch3" angle 360 about axis through (3.5028, 0, -3.9972) along (0, 0, 1) separate body
sketch "Sketch4" plane through (3.5028, 0, -3.1972) normal (0, 0, 1) x (1, 0, 0)
  circle A0 centre (-1.7728, 0) radius 0.05
  line L0 (-2, -0.25) -> (-2, 0.25) construction
  line L1 (-2, 0.25) -> (-1.5, 0.25) construction
  line L2 (-1.5728, 0.25) -> (-1.9728, 0.25) construction
  line L3 (-2, 0) -> (-1.7728, 0) construction
  line L4 (-1.7728, 0) -> (-1.7728, 0.25) construction
  line L5 (-1.7728, 0.25) -> (-2, 0.25) construction
  line L6 (-2, 0.25) -> (-2, 0) construction
  circle A1 centre (0, 0) radius 0.05
  point P0 (-3.5028, 0)
  dimension "d109" = 0.1
sketch "Sketch5" plane through (0, 0, 0) normal (0, 1, 0) x (-1, 0, 0)
  line L0 (-5.5, -2.5) -> (-0.5, -2.5) construction
  line L1 (-5.5, -7.5) -> (-0.5, -7.5) construction
  line L2 (-1.5028, -3.1972) -> (-2.0028, -3.1972) construction
  line L3 (-4.5028, -3.1972) -> (-2.5028, -3.1972) construction
  line L4 (-1.7528, -3.1972) -> (-3.5028, -3.1972) construction
  arc A0 (-1.7528, -3.1972) -> (-3.5028, -3.1972) centre (-2.6278, -3.1972) ccw
  point P0 (0, 0)
sweep "Sweep1" add profiles "Sketch4" path "Sketch5" separate body contours A0
equation "\"d10\" = Diameter_Led"
equation "\"d13\" = Diameter_Led"
equation "\"d20\" = 0.5 * Jarak_Kaki"
equation "\"Diameter_Led\" = 5"
properties part number "LED 5mm"
